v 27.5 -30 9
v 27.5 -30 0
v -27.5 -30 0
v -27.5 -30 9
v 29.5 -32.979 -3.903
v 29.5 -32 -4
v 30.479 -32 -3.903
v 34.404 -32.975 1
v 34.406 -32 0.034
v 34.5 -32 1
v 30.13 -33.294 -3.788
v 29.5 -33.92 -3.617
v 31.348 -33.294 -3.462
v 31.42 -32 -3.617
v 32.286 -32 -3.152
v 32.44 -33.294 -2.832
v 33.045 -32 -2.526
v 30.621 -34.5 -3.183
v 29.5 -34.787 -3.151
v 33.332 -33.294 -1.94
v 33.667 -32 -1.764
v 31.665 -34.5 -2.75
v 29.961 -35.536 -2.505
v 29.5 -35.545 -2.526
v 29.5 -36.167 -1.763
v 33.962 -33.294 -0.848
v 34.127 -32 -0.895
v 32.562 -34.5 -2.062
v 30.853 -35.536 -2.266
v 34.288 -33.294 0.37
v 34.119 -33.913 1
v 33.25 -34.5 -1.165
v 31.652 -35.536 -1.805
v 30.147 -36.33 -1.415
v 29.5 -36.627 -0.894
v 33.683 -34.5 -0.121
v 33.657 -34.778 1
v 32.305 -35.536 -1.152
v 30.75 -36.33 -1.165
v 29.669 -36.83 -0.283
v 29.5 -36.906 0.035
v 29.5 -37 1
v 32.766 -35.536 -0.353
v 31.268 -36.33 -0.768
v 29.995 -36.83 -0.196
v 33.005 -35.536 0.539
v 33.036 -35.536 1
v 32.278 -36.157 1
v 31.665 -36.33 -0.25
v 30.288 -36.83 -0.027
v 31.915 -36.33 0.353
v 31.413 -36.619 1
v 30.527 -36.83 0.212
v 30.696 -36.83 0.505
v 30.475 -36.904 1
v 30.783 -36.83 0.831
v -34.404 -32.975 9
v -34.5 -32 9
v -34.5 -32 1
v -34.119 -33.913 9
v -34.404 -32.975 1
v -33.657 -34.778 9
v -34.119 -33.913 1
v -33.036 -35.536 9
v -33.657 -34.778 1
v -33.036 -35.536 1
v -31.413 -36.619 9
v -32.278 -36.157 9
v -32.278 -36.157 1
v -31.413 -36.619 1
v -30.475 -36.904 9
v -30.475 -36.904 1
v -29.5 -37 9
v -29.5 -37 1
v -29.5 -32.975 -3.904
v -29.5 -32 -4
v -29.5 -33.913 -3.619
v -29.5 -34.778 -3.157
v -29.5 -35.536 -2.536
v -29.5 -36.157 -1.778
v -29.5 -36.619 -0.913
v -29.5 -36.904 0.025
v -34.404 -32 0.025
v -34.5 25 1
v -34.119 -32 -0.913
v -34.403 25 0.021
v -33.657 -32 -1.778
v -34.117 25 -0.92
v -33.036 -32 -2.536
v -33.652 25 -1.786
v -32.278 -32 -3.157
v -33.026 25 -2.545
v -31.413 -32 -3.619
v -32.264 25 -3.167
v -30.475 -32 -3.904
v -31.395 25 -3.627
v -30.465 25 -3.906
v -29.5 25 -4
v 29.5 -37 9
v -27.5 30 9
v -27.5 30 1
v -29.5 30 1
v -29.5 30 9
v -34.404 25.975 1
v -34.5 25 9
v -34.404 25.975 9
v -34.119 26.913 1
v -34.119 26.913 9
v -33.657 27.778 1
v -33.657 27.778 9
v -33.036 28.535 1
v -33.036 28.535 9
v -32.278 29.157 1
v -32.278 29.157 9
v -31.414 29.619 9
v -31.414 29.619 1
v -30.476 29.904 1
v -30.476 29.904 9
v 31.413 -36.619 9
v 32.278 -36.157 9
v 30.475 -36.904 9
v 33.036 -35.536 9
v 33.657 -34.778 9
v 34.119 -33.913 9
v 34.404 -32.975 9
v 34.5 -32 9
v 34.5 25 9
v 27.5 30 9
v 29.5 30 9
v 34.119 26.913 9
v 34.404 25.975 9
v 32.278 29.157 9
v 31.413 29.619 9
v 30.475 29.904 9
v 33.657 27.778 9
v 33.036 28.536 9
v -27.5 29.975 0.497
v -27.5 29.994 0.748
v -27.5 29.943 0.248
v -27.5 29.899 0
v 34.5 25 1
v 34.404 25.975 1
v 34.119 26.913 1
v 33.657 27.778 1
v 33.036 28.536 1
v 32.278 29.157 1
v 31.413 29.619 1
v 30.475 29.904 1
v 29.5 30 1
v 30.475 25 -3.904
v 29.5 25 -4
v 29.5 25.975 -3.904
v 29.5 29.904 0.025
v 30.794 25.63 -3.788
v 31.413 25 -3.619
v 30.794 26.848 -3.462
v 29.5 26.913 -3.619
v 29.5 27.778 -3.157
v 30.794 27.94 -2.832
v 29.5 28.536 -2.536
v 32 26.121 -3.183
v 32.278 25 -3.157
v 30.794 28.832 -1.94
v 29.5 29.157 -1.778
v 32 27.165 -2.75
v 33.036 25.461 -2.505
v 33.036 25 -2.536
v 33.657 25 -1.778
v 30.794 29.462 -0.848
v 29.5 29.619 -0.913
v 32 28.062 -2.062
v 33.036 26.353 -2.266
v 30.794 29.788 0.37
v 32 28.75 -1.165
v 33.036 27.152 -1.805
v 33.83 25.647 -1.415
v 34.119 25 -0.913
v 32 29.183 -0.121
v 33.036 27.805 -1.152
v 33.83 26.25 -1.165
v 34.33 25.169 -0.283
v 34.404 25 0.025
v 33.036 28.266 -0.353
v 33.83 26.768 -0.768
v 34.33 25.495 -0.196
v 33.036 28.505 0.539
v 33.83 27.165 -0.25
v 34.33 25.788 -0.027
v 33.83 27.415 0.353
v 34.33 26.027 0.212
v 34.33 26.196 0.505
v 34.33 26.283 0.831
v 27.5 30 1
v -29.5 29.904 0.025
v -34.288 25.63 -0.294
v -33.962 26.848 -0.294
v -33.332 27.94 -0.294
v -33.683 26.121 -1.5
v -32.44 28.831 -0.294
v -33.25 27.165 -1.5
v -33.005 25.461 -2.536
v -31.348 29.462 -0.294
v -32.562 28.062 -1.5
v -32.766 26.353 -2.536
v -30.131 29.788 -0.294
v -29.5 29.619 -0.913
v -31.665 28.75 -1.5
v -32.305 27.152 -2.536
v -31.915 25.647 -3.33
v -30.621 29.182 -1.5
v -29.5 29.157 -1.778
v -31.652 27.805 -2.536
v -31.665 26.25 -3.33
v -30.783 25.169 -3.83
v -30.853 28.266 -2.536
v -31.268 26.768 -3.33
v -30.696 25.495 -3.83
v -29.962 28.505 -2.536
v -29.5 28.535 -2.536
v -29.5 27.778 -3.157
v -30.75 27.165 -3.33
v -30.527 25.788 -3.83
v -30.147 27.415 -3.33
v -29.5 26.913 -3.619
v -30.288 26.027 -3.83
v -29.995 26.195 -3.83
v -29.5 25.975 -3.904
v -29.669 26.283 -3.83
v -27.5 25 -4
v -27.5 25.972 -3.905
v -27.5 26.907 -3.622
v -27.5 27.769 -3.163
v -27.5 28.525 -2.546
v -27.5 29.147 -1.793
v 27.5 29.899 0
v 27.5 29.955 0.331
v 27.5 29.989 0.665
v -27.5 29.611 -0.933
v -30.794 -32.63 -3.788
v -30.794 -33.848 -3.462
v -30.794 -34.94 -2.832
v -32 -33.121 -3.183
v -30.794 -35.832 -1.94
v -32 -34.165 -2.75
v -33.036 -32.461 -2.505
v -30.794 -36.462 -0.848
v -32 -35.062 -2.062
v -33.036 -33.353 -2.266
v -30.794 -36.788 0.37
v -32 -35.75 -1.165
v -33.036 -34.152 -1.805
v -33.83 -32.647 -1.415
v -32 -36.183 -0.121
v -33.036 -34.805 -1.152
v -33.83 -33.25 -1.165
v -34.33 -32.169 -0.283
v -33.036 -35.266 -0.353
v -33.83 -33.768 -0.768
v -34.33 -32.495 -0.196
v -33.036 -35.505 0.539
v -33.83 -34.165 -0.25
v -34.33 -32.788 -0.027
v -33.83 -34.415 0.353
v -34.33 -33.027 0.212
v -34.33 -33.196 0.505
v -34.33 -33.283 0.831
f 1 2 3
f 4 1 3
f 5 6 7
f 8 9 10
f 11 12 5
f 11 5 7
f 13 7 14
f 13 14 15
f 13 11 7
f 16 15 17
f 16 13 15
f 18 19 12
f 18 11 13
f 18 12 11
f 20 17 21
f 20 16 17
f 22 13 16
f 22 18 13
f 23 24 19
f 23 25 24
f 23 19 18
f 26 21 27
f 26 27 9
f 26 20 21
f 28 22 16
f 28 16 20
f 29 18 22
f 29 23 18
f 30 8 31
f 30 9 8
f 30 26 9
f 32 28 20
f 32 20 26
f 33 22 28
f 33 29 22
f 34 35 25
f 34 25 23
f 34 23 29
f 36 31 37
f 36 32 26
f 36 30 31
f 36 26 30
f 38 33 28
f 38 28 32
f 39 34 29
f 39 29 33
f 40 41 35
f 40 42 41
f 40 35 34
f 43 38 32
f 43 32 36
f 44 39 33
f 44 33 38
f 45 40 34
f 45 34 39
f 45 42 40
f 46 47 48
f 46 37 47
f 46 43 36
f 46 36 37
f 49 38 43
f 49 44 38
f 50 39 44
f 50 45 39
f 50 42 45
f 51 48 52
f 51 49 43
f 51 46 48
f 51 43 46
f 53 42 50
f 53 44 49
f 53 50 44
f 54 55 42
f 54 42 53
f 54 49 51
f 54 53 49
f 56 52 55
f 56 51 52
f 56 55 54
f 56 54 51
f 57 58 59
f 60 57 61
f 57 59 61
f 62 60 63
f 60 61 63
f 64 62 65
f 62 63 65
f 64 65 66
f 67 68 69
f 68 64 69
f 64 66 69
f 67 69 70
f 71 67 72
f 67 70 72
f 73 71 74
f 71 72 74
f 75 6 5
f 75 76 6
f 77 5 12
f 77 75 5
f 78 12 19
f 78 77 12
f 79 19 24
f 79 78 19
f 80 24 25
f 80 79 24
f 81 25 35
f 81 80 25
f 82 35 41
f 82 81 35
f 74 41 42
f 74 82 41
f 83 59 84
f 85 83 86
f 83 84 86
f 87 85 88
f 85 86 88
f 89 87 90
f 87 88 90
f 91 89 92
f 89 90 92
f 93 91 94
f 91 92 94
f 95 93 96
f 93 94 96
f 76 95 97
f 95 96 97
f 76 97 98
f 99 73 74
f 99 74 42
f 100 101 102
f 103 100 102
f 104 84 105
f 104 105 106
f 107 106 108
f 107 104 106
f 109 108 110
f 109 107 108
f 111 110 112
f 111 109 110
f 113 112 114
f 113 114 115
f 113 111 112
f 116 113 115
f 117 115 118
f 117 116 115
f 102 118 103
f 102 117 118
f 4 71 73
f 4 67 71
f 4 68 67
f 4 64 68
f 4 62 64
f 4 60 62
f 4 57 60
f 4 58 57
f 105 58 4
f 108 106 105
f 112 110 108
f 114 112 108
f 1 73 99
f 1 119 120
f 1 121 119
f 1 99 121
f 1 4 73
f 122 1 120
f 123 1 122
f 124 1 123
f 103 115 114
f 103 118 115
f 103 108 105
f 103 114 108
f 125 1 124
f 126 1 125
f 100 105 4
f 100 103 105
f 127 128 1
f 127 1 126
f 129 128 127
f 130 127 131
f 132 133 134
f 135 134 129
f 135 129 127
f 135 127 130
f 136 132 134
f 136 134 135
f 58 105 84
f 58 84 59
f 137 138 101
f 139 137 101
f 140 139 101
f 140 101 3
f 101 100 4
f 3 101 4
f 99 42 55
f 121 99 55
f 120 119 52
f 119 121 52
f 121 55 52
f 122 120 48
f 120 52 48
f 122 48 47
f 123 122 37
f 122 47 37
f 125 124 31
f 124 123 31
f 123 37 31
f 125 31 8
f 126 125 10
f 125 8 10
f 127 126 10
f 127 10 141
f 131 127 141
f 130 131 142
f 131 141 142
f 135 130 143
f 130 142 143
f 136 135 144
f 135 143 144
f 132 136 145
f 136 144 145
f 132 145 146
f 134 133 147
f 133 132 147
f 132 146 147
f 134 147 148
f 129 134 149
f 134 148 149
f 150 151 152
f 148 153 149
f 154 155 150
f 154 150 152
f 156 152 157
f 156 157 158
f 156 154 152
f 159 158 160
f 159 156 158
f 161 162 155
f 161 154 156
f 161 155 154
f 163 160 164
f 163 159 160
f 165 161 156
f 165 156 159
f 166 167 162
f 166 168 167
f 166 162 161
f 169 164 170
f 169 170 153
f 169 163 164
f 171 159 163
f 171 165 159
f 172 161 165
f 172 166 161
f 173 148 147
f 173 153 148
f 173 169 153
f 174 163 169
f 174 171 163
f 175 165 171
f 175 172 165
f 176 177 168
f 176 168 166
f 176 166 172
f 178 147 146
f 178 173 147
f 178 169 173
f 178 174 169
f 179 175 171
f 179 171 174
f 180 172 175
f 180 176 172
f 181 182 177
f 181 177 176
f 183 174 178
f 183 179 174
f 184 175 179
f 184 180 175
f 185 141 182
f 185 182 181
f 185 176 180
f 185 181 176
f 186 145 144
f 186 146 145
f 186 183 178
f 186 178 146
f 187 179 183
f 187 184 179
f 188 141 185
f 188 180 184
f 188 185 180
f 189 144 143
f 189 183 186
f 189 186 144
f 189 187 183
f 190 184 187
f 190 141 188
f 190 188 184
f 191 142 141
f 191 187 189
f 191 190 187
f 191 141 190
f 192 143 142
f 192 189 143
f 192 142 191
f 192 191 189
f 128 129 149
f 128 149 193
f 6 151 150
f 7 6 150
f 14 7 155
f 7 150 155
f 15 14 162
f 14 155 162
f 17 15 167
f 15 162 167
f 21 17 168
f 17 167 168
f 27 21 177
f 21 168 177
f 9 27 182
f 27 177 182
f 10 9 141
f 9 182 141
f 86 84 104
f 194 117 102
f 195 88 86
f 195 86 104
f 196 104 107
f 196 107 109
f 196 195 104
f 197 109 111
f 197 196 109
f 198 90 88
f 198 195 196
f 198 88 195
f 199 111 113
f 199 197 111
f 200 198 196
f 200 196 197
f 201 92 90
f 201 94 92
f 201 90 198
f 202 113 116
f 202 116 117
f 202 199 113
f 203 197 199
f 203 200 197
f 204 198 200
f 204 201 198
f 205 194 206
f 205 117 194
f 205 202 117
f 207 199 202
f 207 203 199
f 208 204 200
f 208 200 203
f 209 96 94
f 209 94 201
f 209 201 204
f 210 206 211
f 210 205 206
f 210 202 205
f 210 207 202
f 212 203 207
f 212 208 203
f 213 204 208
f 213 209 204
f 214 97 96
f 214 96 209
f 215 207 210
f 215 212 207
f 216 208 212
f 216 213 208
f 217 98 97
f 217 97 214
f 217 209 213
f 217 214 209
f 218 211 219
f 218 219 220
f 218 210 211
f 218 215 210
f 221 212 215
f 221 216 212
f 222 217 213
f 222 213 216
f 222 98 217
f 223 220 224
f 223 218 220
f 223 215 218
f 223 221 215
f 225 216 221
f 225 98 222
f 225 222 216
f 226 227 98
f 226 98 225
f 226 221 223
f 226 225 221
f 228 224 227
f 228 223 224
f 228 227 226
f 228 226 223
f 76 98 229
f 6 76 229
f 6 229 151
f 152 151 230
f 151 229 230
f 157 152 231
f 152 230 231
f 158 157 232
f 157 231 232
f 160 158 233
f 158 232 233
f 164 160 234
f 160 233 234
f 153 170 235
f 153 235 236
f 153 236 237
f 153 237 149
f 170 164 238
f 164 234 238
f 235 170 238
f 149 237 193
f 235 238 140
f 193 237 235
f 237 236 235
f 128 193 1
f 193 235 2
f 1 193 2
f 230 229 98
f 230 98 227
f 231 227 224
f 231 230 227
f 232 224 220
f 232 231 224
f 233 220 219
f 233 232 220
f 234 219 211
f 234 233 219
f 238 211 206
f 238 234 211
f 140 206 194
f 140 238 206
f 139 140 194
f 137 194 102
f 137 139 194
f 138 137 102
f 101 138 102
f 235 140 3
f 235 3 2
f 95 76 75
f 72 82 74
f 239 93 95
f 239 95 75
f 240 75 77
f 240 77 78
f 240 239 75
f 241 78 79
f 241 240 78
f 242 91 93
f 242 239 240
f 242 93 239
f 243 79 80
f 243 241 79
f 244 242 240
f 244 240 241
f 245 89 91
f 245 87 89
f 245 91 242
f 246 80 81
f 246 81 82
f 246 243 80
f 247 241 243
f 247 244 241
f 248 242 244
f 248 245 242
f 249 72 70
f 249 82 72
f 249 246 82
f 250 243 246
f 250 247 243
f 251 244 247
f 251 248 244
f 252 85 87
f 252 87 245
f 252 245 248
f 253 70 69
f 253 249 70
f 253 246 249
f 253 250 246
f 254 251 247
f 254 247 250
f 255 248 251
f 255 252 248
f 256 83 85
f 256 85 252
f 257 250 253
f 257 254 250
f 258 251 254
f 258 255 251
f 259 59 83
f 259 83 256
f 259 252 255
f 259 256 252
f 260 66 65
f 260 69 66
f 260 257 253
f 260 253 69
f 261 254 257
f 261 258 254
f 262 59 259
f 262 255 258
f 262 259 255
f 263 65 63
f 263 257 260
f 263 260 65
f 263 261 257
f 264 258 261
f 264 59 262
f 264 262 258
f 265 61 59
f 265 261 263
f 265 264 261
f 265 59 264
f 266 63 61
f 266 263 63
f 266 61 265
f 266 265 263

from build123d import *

# Parameters (mm, degrees)
F1_DEPTH     = 9
F0_W         = 55
F0_H         = 60
F2_DEPTH     = 4
F3_T1_DEPTH  = 74.5
F3_T3_DEPTH  = 19.5
F3_T5_DEPTH  = 92
F3_T7_DEPTH  = 91.9996386864
F3_T9_DEPTH  = 93.9999999907
F4_T1_DEPTH  = 20.5
F4_T3_DEPTH  = 20.4993548139
F4_T8_DEPTH  = 5
F4_S13_W     = 5
F4_S13_H     = 5
F4_T14_DEPTH = 5
F4_S19_W     = 5
F4_S19_H     = 5
F4_T20_DEPTH = 5
F4_S25_W     = 5
F4_S25_H     = 5
F4_T26_DEPTH = 5


# Not quite as in the source:
# - a fillet or chamfer that OpenCascade refuses, or shapes differently, is made with other operations: its cross-section is extruded or revolved along the edge and cut away or added


with BuildPart() as f1:
    # F0 (on Top) → F1 (new body)
    with BuildSketch(Plane.XY):
        Polygon((27.5, 30), (27.5, -30), (-27.5, -30), (-27.5, 30), (-34.4999999907, 29.9996386864), (-34.4999999907, -37), (34.5, -37), (34.5, 30), align=None)
    extrude(amount=F1_DEPTH)

    # F0 (on Top) → F2 (join)
    with BuildSketch(Plane.XY):
        Polygon((27.5, 30), (27.5, -30), (-27.5, -30), (-27.5, 30), (-34.4999999907, 29.9996386864), (-34.4999999907, -37), (34.5, -37), (34.5, 30), align=None)
        Rectangle(F0_W, F0_H)
    extrude(amount=-F2_DEPTH)

    # F3: fillet of radius 5 on 5 edges, made by hand

    # F3_s2 → F3_t1 (cut)
    with BuildSketch(Plane.YZ.offset(-27.5)):
        with BuildLine():
            ThreePointArc((25, -4), (28.5355339059, -2.5355339059), (30, 1))
            Line((30, 1), (30, -4))
            Line((30, -4), (25, -4))
        make_face()
    extrude(amount=F3_T1_DEPTH, mode=Mode.SUBTRACT)

    # F3_s4 → F3_t3 (cut)
    with BuildSketch(Plane(origin=(-27.4984514401, -0.0014193662, 0), x_dir=(0, 0, 1), z_dir=(-0.9999999987, -5.16162e-05, 0))):
        with BuildLine():
            ThreePointArc((-4, 25.0014194062), (-2.5355339059, 28.5369533121), (1, 30.0014194062))
            Line((1, 30.0014194062), (-4, 30.0014194062))
            Line((-4, 30.0014194062), (-4, 25.0014194062))
        make_face()
    extrude(amount=F3_T3_DEPTH, mode=Mode.SUBTRACT)

    # F3_s6 → F3_t5 (cut)
    with BuildSketch(Plane.XZ.offset(-42.5)):
        with BuildLine():
            ThreePointArc((29.5, -4), (33.0355339059, -2.5355339059), (34.5, 1))
            Line((34.5, 1), (34.5, -4))
            Line((34.5, -4), (29.5, -4))
        make_face()
    extrude(amount=F3_T5_DEPTH, mode=Mode.SUBTRACT)

    # F3_s8 → F3_t7 (cut)
    with BuildSketch(Plane.XZ.offset(-42.4996386864)):
        with BuildLine():
            ThreePointArc((-34.4999999907, 1), (-33.0355338966, -2.5355339059), (-29.4999999907, -4))
            Line((-29.4999999907, -4), (-34.4999999907, -4))
            Line((-34.4999999907, -4), (-34.4999999907, 1))
        make_face()
    extrude(amount=F3_T7_DEPTH, mode=Mode.SUBTRACT)

    # F3_s10 → F3_t9 (cut)
    with BuildSketch(Plane.YZ.offset(-46.9999999907)):
        with BuildLine():
            ThreePointArc((-32, -4), (-35.5355339059, -2.5355339059), (-37, 1))
            Line((-37, 1), (-37, -4))
            Line((-37, -4), (-32, -4))
        make_face()
    extrude(amount=F3_T9_DEPTH, mode=Mode.SUBTRACT)

    # F4: fillet of radius 5 on 4 edges, made by hand

    # F4_s2 → F4_t1 (cut)
    with BuildSketch(Plane.XY.offset(1)):
        with BuildLine():
            ThreePointArc((-34.4999999907, -32), (-33.0355338966, -35.5355339059), (-29.4999999907, -37))
            Line((-29.4999999907, -37), (-34.4999999907, -37))
            Line((-34.4999999907, -37), (-34.4999999907, -32))
        make_face()
        with BuildLine():
            ThreePointArc((29.5, -37), (33.0355339059, -35.5355339059), (34.5, -32))
            Line((34.5, -32), (34.5, -37))
            Line((34.5, -37), (29.5, -37))
        make_face()
        with BuildLine():
            ThreePointArc((34.5, 25), (33.0355339059, 28.5355339059), (29.5, 30))
            Line((29.5, 30), (34.5, 30))
            Line((34.5, 30), (34.5, 25))
        make_face()
    extrude(amount=F4_T1_DEPTH, mode=Mode.SUBTRACT)

    # F4_s4 → F4_t3 (cut)
    with BuildSketch(Plane.XY.offset(1)):
        with BuildLine():
            ThreePointArc((-34.4999999907, 24.9998967609), (-33.0356251409, 28.5353394202), (-29.5002580718, 29.9998967542))
            Line((-29.5002580718, 29.9998967542), (-34.4999999907, 29.9996386864))
            Line((-34.4999999907, 29.9996386864), (-34.4999999907, 24.9998967609))
        make_face()
    extrude(amount=F4_T3_DEPTH, mode=Mode.SUBTRACT)


with BuildPart() as f4_tool6:
    # F4_s7 → F4_t8 (new body)
    with BuildSketch(Plane.XY.offset(1)):
        Polygon((-29.4999999907, 24.9998967609), (-34.4999999907, 24.9998967609), (-34.4999999907, 29.9996386864), (-29.5002580718, 29.9998967542), align=None)
    extrude(amount=-F4_T8_DEPTH)

    # F4_s9 → F4_t10 (revolve, cut)
    with BuildSketch(Plane(origin=(-29.4999999907, 24.9998967609, 1), x_dir=(0.70712503, -0.7070885319, 0), z_dir=(0.7070885319, 0.70712503, 0))):
        with BuildLine():
            ThreePointArc((0, -5), (5, 0), (0, 5))
            Line((0, 5), (0, -5))
        make_face()
    revolve(axis=Axis((-29.4999999907, 24.9998967609, 1), (0, 0, -1)), mode=Mode.SUBTRACT)


with BuildPart() as f1_1:
    add(f1.part)

    # F4_t5: cut F4_tool6
    add(f4_tool6.part, mode=Mode.SUBTRACT)


with BuildPart() as f4_tool12:
    # F4_s13 → F4_t14 (new body)
    with BuildSketch(Plane.YZ.offset(29.5)):
        with Locations((27.5, -1.5)):
            Rectangle(F4_S13_W, F4_S13_H)
    extrude(amount=F4_T14_DEPTH)

    # F4_s15 → F4_t16 (revolve, cut)
    with BuildSketch(Plane(origin=(29.5, 25, 1), x_dir=(0, -0.7071067812, 0.7071067812), z_dir=(0, 0.7071067812, 0.7071067812))):
        with BuildLine():
            ThreePointArc((0, -5), (5, 0), (0, 5))
            Line((0, 5), (0, -5))
        make_face()
    revolve(axis=Axis((29.5, 25, 1), (1, 0, 0)), mode=Mode.SUBTRACT)


with BuildPart() as f1_2:
    add(f1_1.part)

    # F4_t11: cut F4_tool12
    add(f4_tool12.part, mode=Mode.SUBTRACT)


with BuildPart() as f4_tool18:
    # F4_s19 → F4_t20 (new body)
    with BuildSketch(Plane.XZ.offset(32)):
        with Locations((32, -1.5)):
            Rectangle(F4_S19_W, F4_S19_H)
    extrude(amount=F4_T20_DEPTH)

    # F4_s21 → F4_t22 (revolve, cut)
    with BuildSketch(Plane(origin=(29.5, -32, 1), x_dir=(-0.7071067812, 0, 0.7071067812), z_dir=(0.7071067812, 0, 0.7071067812))):
        with BuildLine():
            ThreePointArc((0, -5), (5, 0), (0, 5))
            Line((0, 5), (0, -5))
        make_face()
    revolve(axis=Axis((29.5, -32, 1), (0, -1, 0)), mode=Mode.SUBTRACT)


with BuildPart() as f1_3:
    add(f1_2.part)

    # F4_t17: cut F4_tool18
    add(f4_tool18.part, mode=Mode.SUBTRACT)


with BuildPart() as f4_tool24:
    # F4_s25 → F4_t26 (new body)
    with BuildSketch(Plane.YZ.offset(-29.4999999907)):
        with Locations((-34.5, -1.5)):
            Rectangle(F4_S25_W, F4_S25_H)
    extrude(amount=-F4_T26_DEPTH)

    # F4_s27 → F4_t28 (revolve, cut)
    with BuildSketch(Plane(origin=(-29.4999999907, -32, 1), x_dir=(0, 0.7071067812, 0.7071067812), z_dir=(0, -0.7071067812, 0.7071067812))):
        with BuildLine():
            ThreePointArc((0, -5), (5, 0), (0, 5))
            Line((0, 5), (0, -5))
        make_face()
    revolve(axis=Axis((-29.4999999907, -32, 1), (-1, 0, 0)), mode=Mode.SUBTRACT)


with BuildPart() as f1_4:
    add(f1_3.part)

    # F4_t23: cut F4_tool24
    add(f4_tool24.part, mode=Mode.SUBTRACT)


solid = f1_4.part
